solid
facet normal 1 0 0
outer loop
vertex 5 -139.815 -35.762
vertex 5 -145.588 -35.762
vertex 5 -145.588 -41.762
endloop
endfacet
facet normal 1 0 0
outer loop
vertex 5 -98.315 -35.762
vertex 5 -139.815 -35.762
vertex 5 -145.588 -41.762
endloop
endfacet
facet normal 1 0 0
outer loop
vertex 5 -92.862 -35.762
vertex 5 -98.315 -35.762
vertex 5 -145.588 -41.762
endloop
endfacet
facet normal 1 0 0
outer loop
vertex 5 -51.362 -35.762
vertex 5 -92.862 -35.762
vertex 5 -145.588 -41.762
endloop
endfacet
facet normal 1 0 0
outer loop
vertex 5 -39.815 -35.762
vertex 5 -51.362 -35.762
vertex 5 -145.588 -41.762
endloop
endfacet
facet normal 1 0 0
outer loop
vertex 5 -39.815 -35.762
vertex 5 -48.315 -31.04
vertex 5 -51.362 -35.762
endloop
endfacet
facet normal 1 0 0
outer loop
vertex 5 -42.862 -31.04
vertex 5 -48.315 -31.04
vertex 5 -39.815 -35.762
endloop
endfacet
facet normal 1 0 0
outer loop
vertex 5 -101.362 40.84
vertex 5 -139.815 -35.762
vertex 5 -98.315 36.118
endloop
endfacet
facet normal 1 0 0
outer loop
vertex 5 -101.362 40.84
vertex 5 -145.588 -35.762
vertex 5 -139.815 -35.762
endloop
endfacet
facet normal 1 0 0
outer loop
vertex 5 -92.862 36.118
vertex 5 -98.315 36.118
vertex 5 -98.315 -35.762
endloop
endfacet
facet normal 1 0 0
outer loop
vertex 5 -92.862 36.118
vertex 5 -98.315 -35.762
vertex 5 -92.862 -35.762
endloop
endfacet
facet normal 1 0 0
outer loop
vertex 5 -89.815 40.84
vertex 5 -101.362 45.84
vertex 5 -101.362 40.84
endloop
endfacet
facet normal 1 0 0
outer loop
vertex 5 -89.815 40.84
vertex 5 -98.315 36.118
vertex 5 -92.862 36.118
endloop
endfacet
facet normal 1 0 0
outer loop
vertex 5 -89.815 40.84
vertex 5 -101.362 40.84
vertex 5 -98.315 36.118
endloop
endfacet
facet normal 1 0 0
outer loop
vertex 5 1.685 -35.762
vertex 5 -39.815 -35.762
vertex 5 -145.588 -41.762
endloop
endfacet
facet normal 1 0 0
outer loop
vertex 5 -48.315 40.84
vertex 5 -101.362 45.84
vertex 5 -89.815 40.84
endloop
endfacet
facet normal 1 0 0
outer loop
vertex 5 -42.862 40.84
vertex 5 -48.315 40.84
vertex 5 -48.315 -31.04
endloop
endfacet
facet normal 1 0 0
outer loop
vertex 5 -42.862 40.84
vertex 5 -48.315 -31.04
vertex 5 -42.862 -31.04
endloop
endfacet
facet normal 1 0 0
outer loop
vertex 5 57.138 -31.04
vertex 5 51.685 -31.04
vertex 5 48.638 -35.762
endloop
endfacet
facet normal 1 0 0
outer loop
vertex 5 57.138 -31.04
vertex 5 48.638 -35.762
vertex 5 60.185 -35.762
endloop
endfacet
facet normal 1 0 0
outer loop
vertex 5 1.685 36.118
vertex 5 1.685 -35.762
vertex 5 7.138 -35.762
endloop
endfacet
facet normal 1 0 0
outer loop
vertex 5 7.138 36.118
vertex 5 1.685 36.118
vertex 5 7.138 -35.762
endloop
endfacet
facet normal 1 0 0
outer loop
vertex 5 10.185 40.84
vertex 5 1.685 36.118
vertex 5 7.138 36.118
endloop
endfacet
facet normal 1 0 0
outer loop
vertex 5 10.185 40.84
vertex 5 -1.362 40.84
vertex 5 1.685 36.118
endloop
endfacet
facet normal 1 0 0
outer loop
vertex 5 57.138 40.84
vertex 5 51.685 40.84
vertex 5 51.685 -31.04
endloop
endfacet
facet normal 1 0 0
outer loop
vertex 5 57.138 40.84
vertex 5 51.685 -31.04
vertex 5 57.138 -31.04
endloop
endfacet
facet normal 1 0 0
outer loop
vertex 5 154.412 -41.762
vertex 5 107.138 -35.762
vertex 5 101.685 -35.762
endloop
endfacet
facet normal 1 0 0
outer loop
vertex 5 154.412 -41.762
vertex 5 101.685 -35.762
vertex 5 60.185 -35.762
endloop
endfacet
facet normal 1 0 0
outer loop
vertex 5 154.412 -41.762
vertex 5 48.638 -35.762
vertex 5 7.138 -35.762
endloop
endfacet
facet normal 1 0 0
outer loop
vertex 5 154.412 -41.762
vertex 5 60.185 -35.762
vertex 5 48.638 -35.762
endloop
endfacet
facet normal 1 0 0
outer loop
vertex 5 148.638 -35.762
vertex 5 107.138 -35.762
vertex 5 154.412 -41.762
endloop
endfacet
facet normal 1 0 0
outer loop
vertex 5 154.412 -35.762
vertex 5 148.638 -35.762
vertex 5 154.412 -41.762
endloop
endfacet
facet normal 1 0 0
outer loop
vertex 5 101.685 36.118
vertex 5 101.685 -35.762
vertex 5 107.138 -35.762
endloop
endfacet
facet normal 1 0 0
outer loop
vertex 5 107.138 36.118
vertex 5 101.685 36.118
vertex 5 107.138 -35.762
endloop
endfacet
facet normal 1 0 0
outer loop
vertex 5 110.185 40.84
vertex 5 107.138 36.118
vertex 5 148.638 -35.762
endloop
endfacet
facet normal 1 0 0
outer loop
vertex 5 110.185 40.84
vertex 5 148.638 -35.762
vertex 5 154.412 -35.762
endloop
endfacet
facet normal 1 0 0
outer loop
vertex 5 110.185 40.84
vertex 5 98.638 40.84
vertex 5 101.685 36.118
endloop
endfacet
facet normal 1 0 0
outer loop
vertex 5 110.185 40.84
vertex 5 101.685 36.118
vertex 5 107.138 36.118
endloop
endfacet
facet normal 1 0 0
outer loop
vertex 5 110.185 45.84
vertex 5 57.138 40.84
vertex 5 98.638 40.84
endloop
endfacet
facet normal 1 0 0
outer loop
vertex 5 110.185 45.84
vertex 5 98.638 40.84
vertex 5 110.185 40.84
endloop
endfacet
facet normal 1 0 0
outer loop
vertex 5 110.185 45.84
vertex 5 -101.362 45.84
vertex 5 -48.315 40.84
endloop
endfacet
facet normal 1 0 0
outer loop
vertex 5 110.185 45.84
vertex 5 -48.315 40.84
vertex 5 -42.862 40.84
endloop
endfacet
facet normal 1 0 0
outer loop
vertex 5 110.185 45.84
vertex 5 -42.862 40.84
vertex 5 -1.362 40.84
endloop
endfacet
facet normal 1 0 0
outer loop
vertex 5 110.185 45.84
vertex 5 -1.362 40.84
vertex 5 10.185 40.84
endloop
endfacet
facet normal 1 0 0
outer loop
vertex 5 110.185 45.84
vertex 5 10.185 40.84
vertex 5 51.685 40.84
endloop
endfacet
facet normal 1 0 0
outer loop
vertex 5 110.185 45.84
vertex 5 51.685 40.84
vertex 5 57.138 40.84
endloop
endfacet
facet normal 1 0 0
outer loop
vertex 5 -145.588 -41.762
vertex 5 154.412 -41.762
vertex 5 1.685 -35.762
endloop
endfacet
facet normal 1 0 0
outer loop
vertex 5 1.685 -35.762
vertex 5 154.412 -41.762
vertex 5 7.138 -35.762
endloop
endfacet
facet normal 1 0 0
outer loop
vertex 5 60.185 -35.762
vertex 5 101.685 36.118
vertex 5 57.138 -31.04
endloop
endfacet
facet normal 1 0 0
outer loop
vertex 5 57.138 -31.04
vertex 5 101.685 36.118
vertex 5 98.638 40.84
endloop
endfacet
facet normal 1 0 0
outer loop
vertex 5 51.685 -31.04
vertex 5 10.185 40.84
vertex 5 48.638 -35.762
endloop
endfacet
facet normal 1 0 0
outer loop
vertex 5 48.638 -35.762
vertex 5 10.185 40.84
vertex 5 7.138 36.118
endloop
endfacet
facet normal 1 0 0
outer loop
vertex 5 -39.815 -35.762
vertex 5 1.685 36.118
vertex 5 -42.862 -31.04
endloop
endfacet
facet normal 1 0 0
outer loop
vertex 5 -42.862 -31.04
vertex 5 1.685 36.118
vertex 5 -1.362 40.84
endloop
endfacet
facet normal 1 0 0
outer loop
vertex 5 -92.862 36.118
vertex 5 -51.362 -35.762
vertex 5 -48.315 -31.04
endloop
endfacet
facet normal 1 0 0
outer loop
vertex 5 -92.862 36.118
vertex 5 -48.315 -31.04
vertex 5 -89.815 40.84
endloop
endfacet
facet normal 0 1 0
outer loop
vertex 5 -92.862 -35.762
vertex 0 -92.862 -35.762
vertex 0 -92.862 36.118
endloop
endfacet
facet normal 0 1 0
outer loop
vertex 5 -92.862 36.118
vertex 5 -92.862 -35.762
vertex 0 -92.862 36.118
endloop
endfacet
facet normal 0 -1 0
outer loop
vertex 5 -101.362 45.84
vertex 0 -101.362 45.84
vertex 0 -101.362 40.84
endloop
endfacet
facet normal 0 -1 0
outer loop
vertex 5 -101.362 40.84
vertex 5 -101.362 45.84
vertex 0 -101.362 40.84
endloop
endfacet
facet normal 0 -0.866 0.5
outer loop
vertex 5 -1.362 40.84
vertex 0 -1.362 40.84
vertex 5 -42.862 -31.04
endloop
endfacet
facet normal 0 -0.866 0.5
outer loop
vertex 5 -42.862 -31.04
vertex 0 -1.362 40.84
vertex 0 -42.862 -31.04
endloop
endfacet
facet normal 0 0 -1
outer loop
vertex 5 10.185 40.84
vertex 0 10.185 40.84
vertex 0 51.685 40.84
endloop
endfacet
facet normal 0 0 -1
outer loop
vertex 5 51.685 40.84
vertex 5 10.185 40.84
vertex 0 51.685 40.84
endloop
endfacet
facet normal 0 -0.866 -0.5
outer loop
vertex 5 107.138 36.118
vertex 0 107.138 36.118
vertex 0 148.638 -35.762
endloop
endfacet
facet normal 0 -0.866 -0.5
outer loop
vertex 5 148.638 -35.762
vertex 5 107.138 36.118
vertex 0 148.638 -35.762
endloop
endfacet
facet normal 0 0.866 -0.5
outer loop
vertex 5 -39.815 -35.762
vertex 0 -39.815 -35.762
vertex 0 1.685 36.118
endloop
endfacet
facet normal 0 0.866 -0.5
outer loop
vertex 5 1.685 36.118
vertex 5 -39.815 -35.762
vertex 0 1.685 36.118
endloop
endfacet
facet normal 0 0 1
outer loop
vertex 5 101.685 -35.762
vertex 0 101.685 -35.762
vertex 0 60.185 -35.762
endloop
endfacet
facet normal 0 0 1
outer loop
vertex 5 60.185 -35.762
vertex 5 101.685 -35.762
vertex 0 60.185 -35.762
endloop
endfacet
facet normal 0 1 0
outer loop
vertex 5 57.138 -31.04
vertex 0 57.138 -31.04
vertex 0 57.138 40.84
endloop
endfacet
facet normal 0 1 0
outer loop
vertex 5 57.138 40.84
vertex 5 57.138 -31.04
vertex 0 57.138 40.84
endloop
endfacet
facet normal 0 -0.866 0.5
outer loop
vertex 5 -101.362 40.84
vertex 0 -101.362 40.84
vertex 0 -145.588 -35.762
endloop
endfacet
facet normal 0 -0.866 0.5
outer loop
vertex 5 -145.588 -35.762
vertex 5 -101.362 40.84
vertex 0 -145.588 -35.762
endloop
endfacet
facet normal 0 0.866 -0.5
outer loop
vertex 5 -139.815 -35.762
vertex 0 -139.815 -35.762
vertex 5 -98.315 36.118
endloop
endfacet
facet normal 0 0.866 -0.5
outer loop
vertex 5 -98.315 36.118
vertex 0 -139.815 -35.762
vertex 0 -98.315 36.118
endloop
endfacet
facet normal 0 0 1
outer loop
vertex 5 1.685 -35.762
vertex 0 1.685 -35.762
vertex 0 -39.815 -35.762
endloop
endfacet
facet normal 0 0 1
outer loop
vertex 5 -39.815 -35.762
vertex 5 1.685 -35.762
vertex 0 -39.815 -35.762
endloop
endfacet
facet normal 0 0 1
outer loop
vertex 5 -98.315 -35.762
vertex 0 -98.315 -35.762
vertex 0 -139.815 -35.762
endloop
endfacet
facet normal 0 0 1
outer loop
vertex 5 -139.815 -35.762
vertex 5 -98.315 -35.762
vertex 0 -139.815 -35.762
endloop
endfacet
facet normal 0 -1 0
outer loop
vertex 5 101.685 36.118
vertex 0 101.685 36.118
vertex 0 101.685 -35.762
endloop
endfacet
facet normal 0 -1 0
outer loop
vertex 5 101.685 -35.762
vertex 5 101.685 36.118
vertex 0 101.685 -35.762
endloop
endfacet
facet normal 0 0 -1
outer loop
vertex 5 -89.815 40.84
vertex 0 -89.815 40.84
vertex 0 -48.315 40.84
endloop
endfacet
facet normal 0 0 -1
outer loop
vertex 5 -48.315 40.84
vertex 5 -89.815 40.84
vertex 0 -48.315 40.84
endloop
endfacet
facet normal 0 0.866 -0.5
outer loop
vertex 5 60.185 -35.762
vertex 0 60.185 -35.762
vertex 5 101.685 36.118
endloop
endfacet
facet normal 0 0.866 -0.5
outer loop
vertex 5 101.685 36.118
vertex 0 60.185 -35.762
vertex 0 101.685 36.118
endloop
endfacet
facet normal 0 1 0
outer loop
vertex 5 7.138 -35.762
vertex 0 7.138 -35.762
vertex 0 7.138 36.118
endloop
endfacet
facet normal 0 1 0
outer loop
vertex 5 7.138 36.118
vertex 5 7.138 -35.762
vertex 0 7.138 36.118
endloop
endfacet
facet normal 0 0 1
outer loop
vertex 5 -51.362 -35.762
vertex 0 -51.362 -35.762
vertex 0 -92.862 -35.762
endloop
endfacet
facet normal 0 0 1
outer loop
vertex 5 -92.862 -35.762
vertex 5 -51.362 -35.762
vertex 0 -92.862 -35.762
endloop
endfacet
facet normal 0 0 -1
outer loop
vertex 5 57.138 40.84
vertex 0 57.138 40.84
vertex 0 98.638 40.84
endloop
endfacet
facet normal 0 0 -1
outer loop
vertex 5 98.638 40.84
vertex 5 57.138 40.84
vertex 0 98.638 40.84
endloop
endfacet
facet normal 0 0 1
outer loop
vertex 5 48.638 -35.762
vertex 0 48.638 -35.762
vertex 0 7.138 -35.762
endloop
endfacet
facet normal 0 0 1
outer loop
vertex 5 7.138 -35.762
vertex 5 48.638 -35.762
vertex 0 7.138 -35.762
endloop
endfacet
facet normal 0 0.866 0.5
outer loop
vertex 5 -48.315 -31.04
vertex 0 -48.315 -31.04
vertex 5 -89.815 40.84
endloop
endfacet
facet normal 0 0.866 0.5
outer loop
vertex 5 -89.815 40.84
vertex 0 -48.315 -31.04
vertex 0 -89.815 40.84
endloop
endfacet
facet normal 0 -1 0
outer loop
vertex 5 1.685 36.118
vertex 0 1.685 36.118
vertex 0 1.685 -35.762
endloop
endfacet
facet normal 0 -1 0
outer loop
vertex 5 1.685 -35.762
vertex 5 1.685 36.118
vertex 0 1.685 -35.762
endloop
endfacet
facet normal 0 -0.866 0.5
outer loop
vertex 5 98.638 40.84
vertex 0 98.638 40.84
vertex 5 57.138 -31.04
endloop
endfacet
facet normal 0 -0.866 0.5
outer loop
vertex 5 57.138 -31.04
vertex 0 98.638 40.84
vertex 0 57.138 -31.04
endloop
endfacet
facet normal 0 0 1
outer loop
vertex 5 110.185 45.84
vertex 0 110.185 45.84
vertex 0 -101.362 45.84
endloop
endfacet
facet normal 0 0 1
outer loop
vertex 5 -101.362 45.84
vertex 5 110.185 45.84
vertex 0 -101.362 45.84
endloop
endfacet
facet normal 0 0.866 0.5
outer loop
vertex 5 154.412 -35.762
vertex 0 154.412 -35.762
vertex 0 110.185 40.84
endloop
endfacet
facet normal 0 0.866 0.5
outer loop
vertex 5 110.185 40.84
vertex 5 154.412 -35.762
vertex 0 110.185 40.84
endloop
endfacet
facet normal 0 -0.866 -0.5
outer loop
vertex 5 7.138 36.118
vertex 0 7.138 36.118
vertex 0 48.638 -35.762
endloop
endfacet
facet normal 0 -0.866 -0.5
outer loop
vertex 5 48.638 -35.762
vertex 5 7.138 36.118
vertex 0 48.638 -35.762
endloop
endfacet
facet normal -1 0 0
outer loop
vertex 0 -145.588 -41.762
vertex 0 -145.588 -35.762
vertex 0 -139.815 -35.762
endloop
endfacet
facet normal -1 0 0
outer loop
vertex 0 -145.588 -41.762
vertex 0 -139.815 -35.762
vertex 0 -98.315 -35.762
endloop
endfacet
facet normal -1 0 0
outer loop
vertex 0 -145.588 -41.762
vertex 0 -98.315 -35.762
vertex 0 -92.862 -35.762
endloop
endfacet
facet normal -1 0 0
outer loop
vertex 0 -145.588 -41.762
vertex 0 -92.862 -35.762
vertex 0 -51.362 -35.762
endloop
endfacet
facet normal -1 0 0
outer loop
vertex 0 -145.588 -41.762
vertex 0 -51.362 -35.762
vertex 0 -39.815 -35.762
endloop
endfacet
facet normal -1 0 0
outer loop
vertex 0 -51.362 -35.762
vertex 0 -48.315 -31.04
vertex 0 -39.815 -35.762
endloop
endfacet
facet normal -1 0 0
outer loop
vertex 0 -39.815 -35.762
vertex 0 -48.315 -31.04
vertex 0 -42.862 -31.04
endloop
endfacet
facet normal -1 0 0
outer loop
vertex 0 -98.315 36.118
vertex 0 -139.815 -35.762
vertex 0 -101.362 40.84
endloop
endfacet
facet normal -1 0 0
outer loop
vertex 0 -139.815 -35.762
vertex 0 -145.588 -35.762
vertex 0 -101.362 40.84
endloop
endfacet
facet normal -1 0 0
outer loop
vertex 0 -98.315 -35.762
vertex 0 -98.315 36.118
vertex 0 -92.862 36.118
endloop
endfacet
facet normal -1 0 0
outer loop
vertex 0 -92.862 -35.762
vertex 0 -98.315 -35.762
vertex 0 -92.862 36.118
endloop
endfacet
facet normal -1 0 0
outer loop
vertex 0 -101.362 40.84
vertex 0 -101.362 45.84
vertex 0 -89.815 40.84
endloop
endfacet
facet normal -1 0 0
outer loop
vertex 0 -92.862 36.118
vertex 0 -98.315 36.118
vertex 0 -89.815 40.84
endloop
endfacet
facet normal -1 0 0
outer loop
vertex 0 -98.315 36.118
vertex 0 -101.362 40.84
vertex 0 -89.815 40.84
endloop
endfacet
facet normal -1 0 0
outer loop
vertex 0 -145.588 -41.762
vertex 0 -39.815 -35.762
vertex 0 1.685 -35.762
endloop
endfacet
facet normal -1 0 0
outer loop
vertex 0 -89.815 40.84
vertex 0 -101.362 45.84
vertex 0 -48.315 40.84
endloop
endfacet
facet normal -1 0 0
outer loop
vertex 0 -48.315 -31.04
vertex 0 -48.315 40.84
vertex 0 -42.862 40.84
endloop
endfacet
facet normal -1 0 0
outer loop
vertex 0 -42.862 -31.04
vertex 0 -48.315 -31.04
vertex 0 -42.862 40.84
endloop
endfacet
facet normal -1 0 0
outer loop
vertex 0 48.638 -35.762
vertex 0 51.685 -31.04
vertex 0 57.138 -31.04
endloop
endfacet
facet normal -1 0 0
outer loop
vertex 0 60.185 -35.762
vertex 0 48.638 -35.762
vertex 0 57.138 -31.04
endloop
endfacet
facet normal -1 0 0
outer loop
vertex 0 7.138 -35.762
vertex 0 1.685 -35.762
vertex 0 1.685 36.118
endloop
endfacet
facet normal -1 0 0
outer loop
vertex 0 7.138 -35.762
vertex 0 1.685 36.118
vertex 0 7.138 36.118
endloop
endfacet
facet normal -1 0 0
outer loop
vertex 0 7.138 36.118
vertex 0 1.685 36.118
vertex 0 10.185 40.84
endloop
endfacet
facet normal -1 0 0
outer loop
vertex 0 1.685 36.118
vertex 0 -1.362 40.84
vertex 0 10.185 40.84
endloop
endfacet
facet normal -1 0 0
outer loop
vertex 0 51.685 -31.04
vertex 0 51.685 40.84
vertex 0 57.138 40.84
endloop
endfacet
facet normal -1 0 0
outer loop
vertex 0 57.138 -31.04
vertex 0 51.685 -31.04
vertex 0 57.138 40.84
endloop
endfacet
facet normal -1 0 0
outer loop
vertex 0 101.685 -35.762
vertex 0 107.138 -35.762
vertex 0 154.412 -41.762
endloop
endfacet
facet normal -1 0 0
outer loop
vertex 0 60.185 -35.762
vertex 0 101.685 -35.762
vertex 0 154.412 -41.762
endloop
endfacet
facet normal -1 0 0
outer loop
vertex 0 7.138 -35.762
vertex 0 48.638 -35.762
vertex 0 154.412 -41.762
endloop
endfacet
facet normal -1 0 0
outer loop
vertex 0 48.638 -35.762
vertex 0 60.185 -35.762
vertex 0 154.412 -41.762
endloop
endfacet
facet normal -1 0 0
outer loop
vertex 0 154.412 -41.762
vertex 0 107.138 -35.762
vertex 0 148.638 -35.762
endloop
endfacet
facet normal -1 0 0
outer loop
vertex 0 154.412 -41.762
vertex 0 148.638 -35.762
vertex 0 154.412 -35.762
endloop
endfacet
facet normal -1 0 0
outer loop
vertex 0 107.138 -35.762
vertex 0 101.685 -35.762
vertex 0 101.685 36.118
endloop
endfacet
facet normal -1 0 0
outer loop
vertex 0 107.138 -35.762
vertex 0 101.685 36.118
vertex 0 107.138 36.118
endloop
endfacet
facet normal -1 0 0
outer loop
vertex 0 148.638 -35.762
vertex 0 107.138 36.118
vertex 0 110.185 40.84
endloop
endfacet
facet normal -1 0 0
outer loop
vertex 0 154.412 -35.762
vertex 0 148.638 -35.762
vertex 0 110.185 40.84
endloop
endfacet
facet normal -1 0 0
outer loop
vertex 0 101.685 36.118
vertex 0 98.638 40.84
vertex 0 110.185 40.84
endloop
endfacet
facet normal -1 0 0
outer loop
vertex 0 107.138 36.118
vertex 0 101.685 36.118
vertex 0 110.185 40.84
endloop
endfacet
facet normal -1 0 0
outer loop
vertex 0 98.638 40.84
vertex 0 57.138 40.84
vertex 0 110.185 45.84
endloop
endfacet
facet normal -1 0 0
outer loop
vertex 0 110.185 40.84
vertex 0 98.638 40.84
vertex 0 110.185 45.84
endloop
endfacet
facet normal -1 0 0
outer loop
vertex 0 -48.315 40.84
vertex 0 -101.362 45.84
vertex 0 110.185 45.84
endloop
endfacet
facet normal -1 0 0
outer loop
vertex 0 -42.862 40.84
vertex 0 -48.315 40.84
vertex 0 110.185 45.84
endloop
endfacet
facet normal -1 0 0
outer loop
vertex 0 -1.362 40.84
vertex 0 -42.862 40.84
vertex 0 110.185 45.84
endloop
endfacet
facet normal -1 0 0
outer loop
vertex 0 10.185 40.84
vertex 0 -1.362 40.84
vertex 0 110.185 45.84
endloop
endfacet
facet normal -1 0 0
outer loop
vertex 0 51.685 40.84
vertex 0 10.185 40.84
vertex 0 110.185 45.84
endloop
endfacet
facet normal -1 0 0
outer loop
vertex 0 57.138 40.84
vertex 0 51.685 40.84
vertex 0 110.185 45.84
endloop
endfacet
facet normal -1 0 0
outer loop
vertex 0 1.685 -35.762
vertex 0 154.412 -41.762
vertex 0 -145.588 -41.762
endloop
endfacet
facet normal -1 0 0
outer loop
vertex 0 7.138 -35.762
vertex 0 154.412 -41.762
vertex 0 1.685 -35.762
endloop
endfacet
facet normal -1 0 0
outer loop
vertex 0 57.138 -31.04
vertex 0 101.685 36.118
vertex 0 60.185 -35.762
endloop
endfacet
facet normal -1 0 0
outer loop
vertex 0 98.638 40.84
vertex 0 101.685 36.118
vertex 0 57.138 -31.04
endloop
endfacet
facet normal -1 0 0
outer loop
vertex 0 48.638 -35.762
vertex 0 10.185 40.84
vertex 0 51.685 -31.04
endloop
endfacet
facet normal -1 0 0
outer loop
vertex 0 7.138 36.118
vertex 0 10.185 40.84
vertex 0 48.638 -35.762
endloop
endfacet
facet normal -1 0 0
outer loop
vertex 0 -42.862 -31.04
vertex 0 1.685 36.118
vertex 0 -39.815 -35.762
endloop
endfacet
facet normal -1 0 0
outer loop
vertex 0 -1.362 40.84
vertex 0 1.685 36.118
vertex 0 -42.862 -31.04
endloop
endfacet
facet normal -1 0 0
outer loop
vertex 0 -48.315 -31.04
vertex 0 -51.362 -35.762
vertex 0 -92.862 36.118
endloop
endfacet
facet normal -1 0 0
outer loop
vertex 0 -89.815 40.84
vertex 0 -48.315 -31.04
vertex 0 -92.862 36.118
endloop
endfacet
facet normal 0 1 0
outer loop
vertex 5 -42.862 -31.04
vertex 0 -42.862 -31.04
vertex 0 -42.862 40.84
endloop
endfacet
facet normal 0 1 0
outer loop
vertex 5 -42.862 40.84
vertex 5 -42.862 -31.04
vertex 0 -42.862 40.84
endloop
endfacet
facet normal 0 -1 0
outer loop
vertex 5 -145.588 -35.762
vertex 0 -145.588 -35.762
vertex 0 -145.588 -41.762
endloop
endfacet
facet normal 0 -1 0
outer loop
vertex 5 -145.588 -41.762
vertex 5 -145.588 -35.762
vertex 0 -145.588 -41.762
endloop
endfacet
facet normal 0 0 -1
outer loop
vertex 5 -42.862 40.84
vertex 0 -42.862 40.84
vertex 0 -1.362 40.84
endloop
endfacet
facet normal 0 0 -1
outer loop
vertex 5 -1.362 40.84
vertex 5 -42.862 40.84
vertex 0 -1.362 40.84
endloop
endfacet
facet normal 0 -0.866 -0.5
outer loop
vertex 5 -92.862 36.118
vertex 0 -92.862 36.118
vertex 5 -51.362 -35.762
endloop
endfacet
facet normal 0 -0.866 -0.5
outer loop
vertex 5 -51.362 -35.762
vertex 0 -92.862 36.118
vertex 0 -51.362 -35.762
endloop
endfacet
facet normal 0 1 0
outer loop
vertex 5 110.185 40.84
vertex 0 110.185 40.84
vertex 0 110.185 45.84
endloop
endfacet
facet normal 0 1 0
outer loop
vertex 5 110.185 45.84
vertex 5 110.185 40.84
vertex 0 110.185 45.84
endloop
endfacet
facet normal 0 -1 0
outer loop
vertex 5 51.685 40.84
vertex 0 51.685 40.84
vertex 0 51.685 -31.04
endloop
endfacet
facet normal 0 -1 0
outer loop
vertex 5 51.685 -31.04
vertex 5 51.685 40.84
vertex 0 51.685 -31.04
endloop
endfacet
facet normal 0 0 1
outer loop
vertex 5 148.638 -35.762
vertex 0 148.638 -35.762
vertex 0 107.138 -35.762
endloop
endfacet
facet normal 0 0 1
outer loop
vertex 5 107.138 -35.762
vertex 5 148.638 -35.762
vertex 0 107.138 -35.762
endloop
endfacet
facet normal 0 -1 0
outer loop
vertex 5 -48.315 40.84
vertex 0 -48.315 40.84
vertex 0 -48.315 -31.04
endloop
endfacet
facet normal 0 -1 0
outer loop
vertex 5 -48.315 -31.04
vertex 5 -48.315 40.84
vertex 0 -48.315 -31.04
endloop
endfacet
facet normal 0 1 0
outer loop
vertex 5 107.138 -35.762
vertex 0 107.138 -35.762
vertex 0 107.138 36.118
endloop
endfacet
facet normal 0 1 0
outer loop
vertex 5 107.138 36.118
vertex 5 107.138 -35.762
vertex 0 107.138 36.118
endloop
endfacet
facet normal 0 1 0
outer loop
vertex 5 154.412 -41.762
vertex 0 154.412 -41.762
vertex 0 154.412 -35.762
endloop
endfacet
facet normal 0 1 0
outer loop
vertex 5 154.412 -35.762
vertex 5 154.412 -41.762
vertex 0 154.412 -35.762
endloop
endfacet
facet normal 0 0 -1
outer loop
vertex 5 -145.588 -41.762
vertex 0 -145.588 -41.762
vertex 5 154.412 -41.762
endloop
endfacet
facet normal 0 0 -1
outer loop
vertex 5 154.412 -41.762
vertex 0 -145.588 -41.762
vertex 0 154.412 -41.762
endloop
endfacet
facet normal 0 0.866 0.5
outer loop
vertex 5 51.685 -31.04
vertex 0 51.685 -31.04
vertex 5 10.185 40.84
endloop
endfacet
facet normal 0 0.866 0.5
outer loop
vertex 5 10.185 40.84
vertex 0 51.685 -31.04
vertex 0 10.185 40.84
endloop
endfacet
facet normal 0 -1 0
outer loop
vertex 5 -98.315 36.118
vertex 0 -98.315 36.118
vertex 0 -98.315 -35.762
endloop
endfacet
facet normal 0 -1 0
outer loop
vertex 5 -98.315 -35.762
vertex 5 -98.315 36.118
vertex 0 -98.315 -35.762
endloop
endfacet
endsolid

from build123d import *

# Parameters (mm, degrees)
F1_DEPTH = 5


with BuildPart() as f1:
    # F0 (on Right) → F1 (new body)
    with BuildSketch(Plane.YZ):
        Polygon((104.411765, 40.84024), (110.185267, 40.84024), (110.185267, 45.84024), (-101.361738, 45.84024), (-101.361738, 40.84024), (-95.588235, 40.84024), (-89.814733, 40.84024), (-48.314733, 40.84024), (-42.861738, 40.84024), (-1.361738, 40.84024), (4.411765, 40.84024), (10.185267, 40.84024), (51.685267, 40.84024), (57.138262, 40.84024), (98.638262, 40.84024), align=None)
        Polygon((-89.814733, 40.84024), (-95.588235, 40.84024), (-92.861738, 36.117808), (-51.361738, -35.7623), (-45.588235, -35.7623), (-48.314733, -31.039869), align=None)
        Polygon((-98.314733, 36.117808), (-98.314733, -35.7623), (-92.861738, -35.7623), (-92.861738, 36.117808), (-95.588235, 40.84024), align=None)
        Polygon((-48.314733, 40.84024), (-48.314733, -31.039869), (-45.588235, -35.7623), (-42.861738, -31.039869), (-42.861738, 40.84024), align=None)
        Polygon((-42.861738, -31.039869), (-45.588235, -35.7623), (-39.814733, -35.7623), (1.685267, 36.117808), (4.411765, 40.84024), (-1.361738, 40.84024), align=None)
        Polygon((-101.361738, 40.84024), (-145.588235, -35.7623), (-139.814733, -35.7623), (-98.314733, 36.117808), (-95.588235, 40.84024), align=None)
        Polygon((-145.588235, -41.7623), (154.411765, -41.7623), (154.411765, -35.7623), (148.638262, -35.7623), (107.138262, -35.7623), (101.685267, -35.7623), (60.185267, -35.7623), (54.411765, -35.7623), (48.638262, -35.7623), (7.138262, -35.7623), (1.685267, -35.7623), (-39.814733, -35.7623), (-45.588235, -35.7623), (-51.361738, -35.7623), (-92.861738, -35.7623), (-98.314733, -35.7623), (-139.814733, -35.7623), (-145.588235, -35.7623), align=None)
        Polygon((1.685267, -35.7623), (7.138262, -35.7623), (7.138262, 36.117808), (4.411765, 40.84024), (1.685267, 36.117808), align=None)
        Polygon((48.638262, -35.7623), (54.411765, -35.7623), (51.685267, -31.039869), (10.185267, 40.84024), (4.411765, 40.84024), (7.138262, 36.117808), align=None)
        Polygon((54.411765, -35.7623), (57.138262, -31.039869), (57.138262, 40.84024), (51.685267, 40.84024), (51.685267, -31.039869), align=None)
        Polygon((101.685267, 36.117808), (104.411765, 40.84024), (98.638262, 40.84024), (57.138262, -31.039869), (54.411765, -35.7623), (60.185267, -35.7623), align=None)
        Polygon((101.685267, -35.7623), (107.138262, -35.7623), (107.138262, 36.117808), (104.411765, 40.84024), (101.685267, 36.117808), align=None)
        Polygon((148.638262, -35.7623), (154.411765, -35.7623), (110.185267, 40.84024), (104.411765, 40.84024), (107.138262, 36.117808), align=None)
    extrude(amount=F1_DEPTH)


solid = f1.part
